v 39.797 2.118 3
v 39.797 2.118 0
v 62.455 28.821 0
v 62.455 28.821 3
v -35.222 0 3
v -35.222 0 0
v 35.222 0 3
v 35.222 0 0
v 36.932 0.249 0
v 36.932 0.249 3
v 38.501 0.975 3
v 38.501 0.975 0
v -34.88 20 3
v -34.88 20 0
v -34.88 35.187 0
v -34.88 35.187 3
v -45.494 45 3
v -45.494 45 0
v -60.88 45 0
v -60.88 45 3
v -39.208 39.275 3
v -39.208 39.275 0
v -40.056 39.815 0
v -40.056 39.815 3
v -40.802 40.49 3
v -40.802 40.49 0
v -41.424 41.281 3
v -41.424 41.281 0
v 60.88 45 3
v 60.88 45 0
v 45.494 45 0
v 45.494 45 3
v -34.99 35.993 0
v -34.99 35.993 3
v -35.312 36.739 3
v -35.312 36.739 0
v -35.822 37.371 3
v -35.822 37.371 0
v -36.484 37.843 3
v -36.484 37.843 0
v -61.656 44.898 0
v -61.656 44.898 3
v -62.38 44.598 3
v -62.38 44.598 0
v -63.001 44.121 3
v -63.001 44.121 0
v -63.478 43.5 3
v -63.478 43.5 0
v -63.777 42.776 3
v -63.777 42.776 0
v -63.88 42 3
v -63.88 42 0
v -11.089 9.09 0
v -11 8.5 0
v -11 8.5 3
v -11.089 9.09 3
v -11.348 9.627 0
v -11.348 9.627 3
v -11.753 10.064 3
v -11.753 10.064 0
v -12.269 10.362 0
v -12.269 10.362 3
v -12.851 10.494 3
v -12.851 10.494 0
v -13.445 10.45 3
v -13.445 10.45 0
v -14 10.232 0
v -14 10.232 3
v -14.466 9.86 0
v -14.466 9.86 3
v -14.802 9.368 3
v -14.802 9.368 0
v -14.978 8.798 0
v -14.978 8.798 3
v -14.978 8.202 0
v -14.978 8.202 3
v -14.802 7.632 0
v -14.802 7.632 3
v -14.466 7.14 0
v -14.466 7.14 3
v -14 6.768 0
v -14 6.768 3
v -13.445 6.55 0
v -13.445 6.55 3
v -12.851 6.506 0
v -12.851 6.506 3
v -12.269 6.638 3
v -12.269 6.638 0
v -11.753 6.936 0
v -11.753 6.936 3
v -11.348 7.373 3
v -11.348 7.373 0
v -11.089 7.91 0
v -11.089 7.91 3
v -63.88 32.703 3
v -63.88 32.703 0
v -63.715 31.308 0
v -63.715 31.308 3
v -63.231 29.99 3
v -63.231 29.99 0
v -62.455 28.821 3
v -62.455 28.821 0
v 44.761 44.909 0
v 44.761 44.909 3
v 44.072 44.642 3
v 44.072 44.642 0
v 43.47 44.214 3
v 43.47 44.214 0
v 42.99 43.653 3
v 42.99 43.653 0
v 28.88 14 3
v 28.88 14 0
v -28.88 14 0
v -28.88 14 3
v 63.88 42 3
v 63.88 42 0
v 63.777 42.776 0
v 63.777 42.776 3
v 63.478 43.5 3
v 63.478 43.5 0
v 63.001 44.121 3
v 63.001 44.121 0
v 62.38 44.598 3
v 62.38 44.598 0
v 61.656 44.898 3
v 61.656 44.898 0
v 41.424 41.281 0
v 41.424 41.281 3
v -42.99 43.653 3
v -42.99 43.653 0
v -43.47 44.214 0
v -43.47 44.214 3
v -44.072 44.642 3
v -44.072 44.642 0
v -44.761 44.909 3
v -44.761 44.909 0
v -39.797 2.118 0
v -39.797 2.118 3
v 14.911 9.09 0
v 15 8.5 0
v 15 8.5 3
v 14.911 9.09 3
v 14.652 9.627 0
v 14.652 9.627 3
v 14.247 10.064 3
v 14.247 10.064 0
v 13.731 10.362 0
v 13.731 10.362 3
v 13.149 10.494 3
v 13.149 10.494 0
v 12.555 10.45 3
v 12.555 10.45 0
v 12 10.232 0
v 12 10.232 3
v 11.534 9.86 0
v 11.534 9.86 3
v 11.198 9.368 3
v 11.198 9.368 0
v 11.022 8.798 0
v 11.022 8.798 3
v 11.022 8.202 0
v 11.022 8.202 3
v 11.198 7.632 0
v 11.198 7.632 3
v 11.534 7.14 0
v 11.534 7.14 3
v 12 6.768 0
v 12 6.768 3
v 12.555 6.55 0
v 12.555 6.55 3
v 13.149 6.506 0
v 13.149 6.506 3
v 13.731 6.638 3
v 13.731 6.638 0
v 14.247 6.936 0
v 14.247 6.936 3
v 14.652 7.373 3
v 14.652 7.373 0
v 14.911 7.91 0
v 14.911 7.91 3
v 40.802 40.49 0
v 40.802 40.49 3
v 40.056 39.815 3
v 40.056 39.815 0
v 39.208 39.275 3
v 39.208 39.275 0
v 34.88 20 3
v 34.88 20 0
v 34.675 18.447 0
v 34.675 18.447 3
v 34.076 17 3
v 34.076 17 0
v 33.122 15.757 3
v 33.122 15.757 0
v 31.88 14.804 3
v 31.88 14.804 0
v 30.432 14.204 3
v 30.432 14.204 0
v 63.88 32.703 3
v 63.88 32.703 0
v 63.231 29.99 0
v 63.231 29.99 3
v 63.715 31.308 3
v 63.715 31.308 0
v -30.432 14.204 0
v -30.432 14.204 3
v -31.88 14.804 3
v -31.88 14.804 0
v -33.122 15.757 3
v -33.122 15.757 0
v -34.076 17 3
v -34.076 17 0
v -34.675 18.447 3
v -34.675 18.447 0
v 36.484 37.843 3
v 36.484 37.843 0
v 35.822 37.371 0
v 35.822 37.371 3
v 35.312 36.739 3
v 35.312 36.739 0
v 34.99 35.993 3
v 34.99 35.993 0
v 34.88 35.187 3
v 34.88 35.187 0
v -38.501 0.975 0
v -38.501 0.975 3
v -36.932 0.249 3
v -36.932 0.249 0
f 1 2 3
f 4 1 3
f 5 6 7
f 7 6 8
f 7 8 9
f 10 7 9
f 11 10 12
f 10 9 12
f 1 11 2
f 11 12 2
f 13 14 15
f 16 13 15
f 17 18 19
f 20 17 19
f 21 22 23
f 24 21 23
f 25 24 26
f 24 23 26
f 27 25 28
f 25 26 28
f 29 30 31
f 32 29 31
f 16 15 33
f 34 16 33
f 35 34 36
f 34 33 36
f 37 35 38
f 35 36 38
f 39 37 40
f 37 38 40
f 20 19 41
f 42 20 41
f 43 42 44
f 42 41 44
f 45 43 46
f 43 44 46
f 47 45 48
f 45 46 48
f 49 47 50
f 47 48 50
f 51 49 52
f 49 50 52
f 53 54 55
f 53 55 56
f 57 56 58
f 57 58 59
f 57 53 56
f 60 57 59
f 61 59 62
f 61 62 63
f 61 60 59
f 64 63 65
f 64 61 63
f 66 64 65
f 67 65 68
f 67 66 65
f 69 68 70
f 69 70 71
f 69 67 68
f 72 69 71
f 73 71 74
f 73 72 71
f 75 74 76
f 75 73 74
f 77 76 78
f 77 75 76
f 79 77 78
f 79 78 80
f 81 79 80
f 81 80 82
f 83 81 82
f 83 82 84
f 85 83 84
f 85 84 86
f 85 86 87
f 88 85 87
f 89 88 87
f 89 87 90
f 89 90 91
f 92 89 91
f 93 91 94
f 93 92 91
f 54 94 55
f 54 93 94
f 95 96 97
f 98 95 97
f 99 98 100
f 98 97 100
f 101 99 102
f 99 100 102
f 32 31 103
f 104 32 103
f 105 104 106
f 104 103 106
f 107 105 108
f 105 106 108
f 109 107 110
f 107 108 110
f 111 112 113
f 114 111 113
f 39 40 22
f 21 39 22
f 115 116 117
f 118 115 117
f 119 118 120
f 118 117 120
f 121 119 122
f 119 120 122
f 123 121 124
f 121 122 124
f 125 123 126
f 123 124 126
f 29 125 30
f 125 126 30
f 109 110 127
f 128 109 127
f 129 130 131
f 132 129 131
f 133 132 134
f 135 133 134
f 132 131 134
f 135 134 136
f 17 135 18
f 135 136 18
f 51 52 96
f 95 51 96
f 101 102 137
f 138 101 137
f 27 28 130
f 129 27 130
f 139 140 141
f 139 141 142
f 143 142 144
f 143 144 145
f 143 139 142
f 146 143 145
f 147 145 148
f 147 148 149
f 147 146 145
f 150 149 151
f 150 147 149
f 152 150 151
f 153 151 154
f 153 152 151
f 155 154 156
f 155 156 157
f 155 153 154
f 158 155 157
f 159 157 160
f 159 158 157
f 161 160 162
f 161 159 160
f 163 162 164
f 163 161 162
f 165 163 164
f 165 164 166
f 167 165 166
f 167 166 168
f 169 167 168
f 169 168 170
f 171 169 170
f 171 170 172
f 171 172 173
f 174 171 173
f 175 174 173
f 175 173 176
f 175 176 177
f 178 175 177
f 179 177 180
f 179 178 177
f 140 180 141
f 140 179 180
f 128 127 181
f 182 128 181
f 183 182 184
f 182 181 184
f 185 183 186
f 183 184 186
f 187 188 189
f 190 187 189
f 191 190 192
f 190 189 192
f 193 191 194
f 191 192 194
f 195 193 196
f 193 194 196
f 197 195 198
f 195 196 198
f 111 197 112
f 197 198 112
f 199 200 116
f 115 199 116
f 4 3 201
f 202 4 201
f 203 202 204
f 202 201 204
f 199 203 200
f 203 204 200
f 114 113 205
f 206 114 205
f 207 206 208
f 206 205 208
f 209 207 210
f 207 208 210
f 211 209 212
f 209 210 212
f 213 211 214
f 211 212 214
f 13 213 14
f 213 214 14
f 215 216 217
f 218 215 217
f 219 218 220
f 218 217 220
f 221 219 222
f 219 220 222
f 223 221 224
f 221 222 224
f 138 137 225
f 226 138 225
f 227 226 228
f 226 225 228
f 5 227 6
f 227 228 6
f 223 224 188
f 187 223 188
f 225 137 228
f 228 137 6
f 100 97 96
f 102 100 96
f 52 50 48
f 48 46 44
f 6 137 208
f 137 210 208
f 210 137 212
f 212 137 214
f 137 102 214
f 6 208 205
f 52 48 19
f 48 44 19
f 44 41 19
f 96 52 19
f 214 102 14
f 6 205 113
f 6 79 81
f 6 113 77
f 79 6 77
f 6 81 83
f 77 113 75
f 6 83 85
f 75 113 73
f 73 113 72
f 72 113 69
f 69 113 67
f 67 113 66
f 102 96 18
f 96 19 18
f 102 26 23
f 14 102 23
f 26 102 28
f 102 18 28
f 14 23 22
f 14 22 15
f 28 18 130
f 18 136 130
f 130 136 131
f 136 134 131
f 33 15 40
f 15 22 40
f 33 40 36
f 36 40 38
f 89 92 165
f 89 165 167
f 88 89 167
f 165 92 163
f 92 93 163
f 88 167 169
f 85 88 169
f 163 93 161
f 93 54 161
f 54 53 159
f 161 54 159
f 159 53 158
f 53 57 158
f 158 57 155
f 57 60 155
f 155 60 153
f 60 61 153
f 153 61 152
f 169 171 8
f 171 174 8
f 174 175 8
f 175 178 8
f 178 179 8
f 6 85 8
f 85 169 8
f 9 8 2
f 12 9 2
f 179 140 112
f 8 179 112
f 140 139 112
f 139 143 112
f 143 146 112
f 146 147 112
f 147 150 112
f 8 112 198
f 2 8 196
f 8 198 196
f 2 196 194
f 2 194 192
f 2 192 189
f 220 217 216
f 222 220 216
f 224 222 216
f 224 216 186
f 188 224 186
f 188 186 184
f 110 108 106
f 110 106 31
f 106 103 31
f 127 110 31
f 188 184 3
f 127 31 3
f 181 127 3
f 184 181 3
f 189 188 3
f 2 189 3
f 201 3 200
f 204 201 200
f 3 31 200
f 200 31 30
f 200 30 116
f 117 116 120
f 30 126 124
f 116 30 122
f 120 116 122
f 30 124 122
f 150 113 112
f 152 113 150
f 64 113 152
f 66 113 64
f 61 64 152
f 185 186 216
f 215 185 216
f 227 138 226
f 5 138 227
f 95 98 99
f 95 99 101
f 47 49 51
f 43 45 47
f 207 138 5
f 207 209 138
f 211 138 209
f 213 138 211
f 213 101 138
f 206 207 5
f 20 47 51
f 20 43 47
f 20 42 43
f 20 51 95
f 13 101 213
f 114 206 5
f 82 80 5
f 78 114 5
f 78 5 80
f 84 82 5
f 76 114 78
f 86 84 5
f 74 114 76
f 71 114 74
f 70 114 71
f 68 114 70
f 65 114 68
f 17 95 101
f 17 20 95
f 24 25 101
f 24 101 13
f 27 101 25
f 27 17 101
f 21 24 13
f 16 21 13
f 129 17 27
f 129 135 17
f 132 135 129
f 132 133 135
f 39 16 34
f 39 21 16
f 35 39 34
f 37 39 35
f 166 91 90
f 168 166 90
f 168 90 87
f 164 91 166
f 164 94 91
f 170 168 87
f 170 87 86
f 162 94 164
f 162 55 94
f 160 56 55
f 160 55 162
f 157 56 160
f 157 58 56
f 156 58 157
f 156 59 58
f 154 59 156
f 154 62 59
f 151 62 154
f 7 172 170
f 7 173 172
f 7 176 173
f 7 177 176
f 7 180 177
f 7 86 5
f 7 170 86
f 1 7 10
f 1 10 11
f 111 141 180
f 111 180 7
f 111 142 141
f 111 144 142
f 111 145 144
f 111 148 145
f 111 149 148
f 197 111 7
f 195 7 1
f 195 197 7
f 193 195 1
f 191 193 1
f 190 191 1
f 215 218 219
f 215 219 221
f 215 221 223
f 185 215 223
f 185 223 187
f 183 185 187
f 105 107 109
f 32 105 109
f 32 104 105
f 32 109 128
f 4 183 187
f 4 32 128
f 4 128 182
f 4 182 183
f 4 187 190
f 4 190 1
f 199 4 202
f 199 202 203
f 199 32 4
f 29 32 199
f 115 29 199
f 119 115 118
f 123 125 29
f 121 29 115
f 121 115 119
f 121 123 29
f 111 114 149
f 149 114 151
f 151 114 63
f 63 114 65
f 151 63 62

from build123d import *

# Parameters (mm, degrees)
F0_R     = 2
F1_DEPTH = 3


with BuildPart() as f1:
    # F0 (on Top) → F1 (new body)
    with BuildSketch(Plane.XY):
        with BuildLine():
            Line((-35.222202, 0), (0, 0))
            Line((0, 0), (35.222202, 0))
            ThreePointArc((35.222202, 0), (37.742959, 0.555205), (39.797202, 2.118071))
            Line((39.797202, 2.118071), (62.454529, 28.820584))
            ThreePointArc((62.454529, 28.820584), (63.512024, 30.634906), (63.879529, 32.702513))
            Line((63.879529, 32.702513), (63.879529, 42))
            ThreePointArc((63.879529, 42), (63.000849, 44.12132), (60.879529, 45))
            Line((60.879529, 45), (45.493925, 45))
            ThreePointArc((45.493925, 45), (44.0723, 44.641777), (42.990182, 43.652656))
            Line((42.990182, 43.652656), (41.424434, 41.280578))
            ThreePointArc((41.424434, 41.280578), (40.443151, 40.137329), (39.208001, 39.274578))
            Line((39.208001, 39.274578), (36.484002, 37.843138))
            ThreePointArc((36.484002, 37.843138), (35.311788, 36.738841), (34.879529, 35.187483))
            Line((34.879529, 35.187483), (34.879529, 20))
            ThreePointArc((34.879529, 20), (33.122169, 15.757359), (28.879529, 14))
            Line((28.879529, 14), (0, 14))
            Line((0, 14), (-28.879529, 14))
            ThreePointArc((-28.879529, 14), (-33.122169, 15.757359), (-34.879529, 20))
            Line((-34.879529, 20), (-34.879529, 35.187483))
            ThreePointArc((-34.879529, 35.187483), (-35.311788, 36.738841), (-36.484002, 37.843138))
            Line((-36.484002, 37.843138), (-39.208001, 39.274578))
            ThreePointArc((-39.208001, 39.274578), (-40.443151, 40.137329), (-41.424434, 41.280578))
            Line((-41.424434, 41.280578), (-42.990182, 43.652656))
            ThreePointArc((-42.990182, 43.652656), (-44.0723, 44.641777), (-45.493925, 45))
            Line((-45.493925, 45), (-60.879529, 45))
            ThreePointArc((-60.879529, 45), (-63.000849, 44.12132), (-63.879529, 42))
            Line((-63.879529, 42), (-63.879529, 32.702513))
            ThreePointArc((-63.879529, 32.702513), (-63.512024, 30.634906), (-62.454529, 28.820584))
            Line((-62.454529, 28.820584), (-39.797202, 2.118071))
            ThreePointArc((-39.797202, 2.118071), (-37.742959, 0.555205), (-35.222202, 0))
        make_face()
        with Locations((-13, 8.5)):
            Circle(F0_R, mode=Mode.SUBTRACT)
        with Locations((13, 8.5)):
            Circle(F0_R, mode=Mode.SUBTRACT)
    extrude(amount=F1_DEPTH)


solid = f1.part
